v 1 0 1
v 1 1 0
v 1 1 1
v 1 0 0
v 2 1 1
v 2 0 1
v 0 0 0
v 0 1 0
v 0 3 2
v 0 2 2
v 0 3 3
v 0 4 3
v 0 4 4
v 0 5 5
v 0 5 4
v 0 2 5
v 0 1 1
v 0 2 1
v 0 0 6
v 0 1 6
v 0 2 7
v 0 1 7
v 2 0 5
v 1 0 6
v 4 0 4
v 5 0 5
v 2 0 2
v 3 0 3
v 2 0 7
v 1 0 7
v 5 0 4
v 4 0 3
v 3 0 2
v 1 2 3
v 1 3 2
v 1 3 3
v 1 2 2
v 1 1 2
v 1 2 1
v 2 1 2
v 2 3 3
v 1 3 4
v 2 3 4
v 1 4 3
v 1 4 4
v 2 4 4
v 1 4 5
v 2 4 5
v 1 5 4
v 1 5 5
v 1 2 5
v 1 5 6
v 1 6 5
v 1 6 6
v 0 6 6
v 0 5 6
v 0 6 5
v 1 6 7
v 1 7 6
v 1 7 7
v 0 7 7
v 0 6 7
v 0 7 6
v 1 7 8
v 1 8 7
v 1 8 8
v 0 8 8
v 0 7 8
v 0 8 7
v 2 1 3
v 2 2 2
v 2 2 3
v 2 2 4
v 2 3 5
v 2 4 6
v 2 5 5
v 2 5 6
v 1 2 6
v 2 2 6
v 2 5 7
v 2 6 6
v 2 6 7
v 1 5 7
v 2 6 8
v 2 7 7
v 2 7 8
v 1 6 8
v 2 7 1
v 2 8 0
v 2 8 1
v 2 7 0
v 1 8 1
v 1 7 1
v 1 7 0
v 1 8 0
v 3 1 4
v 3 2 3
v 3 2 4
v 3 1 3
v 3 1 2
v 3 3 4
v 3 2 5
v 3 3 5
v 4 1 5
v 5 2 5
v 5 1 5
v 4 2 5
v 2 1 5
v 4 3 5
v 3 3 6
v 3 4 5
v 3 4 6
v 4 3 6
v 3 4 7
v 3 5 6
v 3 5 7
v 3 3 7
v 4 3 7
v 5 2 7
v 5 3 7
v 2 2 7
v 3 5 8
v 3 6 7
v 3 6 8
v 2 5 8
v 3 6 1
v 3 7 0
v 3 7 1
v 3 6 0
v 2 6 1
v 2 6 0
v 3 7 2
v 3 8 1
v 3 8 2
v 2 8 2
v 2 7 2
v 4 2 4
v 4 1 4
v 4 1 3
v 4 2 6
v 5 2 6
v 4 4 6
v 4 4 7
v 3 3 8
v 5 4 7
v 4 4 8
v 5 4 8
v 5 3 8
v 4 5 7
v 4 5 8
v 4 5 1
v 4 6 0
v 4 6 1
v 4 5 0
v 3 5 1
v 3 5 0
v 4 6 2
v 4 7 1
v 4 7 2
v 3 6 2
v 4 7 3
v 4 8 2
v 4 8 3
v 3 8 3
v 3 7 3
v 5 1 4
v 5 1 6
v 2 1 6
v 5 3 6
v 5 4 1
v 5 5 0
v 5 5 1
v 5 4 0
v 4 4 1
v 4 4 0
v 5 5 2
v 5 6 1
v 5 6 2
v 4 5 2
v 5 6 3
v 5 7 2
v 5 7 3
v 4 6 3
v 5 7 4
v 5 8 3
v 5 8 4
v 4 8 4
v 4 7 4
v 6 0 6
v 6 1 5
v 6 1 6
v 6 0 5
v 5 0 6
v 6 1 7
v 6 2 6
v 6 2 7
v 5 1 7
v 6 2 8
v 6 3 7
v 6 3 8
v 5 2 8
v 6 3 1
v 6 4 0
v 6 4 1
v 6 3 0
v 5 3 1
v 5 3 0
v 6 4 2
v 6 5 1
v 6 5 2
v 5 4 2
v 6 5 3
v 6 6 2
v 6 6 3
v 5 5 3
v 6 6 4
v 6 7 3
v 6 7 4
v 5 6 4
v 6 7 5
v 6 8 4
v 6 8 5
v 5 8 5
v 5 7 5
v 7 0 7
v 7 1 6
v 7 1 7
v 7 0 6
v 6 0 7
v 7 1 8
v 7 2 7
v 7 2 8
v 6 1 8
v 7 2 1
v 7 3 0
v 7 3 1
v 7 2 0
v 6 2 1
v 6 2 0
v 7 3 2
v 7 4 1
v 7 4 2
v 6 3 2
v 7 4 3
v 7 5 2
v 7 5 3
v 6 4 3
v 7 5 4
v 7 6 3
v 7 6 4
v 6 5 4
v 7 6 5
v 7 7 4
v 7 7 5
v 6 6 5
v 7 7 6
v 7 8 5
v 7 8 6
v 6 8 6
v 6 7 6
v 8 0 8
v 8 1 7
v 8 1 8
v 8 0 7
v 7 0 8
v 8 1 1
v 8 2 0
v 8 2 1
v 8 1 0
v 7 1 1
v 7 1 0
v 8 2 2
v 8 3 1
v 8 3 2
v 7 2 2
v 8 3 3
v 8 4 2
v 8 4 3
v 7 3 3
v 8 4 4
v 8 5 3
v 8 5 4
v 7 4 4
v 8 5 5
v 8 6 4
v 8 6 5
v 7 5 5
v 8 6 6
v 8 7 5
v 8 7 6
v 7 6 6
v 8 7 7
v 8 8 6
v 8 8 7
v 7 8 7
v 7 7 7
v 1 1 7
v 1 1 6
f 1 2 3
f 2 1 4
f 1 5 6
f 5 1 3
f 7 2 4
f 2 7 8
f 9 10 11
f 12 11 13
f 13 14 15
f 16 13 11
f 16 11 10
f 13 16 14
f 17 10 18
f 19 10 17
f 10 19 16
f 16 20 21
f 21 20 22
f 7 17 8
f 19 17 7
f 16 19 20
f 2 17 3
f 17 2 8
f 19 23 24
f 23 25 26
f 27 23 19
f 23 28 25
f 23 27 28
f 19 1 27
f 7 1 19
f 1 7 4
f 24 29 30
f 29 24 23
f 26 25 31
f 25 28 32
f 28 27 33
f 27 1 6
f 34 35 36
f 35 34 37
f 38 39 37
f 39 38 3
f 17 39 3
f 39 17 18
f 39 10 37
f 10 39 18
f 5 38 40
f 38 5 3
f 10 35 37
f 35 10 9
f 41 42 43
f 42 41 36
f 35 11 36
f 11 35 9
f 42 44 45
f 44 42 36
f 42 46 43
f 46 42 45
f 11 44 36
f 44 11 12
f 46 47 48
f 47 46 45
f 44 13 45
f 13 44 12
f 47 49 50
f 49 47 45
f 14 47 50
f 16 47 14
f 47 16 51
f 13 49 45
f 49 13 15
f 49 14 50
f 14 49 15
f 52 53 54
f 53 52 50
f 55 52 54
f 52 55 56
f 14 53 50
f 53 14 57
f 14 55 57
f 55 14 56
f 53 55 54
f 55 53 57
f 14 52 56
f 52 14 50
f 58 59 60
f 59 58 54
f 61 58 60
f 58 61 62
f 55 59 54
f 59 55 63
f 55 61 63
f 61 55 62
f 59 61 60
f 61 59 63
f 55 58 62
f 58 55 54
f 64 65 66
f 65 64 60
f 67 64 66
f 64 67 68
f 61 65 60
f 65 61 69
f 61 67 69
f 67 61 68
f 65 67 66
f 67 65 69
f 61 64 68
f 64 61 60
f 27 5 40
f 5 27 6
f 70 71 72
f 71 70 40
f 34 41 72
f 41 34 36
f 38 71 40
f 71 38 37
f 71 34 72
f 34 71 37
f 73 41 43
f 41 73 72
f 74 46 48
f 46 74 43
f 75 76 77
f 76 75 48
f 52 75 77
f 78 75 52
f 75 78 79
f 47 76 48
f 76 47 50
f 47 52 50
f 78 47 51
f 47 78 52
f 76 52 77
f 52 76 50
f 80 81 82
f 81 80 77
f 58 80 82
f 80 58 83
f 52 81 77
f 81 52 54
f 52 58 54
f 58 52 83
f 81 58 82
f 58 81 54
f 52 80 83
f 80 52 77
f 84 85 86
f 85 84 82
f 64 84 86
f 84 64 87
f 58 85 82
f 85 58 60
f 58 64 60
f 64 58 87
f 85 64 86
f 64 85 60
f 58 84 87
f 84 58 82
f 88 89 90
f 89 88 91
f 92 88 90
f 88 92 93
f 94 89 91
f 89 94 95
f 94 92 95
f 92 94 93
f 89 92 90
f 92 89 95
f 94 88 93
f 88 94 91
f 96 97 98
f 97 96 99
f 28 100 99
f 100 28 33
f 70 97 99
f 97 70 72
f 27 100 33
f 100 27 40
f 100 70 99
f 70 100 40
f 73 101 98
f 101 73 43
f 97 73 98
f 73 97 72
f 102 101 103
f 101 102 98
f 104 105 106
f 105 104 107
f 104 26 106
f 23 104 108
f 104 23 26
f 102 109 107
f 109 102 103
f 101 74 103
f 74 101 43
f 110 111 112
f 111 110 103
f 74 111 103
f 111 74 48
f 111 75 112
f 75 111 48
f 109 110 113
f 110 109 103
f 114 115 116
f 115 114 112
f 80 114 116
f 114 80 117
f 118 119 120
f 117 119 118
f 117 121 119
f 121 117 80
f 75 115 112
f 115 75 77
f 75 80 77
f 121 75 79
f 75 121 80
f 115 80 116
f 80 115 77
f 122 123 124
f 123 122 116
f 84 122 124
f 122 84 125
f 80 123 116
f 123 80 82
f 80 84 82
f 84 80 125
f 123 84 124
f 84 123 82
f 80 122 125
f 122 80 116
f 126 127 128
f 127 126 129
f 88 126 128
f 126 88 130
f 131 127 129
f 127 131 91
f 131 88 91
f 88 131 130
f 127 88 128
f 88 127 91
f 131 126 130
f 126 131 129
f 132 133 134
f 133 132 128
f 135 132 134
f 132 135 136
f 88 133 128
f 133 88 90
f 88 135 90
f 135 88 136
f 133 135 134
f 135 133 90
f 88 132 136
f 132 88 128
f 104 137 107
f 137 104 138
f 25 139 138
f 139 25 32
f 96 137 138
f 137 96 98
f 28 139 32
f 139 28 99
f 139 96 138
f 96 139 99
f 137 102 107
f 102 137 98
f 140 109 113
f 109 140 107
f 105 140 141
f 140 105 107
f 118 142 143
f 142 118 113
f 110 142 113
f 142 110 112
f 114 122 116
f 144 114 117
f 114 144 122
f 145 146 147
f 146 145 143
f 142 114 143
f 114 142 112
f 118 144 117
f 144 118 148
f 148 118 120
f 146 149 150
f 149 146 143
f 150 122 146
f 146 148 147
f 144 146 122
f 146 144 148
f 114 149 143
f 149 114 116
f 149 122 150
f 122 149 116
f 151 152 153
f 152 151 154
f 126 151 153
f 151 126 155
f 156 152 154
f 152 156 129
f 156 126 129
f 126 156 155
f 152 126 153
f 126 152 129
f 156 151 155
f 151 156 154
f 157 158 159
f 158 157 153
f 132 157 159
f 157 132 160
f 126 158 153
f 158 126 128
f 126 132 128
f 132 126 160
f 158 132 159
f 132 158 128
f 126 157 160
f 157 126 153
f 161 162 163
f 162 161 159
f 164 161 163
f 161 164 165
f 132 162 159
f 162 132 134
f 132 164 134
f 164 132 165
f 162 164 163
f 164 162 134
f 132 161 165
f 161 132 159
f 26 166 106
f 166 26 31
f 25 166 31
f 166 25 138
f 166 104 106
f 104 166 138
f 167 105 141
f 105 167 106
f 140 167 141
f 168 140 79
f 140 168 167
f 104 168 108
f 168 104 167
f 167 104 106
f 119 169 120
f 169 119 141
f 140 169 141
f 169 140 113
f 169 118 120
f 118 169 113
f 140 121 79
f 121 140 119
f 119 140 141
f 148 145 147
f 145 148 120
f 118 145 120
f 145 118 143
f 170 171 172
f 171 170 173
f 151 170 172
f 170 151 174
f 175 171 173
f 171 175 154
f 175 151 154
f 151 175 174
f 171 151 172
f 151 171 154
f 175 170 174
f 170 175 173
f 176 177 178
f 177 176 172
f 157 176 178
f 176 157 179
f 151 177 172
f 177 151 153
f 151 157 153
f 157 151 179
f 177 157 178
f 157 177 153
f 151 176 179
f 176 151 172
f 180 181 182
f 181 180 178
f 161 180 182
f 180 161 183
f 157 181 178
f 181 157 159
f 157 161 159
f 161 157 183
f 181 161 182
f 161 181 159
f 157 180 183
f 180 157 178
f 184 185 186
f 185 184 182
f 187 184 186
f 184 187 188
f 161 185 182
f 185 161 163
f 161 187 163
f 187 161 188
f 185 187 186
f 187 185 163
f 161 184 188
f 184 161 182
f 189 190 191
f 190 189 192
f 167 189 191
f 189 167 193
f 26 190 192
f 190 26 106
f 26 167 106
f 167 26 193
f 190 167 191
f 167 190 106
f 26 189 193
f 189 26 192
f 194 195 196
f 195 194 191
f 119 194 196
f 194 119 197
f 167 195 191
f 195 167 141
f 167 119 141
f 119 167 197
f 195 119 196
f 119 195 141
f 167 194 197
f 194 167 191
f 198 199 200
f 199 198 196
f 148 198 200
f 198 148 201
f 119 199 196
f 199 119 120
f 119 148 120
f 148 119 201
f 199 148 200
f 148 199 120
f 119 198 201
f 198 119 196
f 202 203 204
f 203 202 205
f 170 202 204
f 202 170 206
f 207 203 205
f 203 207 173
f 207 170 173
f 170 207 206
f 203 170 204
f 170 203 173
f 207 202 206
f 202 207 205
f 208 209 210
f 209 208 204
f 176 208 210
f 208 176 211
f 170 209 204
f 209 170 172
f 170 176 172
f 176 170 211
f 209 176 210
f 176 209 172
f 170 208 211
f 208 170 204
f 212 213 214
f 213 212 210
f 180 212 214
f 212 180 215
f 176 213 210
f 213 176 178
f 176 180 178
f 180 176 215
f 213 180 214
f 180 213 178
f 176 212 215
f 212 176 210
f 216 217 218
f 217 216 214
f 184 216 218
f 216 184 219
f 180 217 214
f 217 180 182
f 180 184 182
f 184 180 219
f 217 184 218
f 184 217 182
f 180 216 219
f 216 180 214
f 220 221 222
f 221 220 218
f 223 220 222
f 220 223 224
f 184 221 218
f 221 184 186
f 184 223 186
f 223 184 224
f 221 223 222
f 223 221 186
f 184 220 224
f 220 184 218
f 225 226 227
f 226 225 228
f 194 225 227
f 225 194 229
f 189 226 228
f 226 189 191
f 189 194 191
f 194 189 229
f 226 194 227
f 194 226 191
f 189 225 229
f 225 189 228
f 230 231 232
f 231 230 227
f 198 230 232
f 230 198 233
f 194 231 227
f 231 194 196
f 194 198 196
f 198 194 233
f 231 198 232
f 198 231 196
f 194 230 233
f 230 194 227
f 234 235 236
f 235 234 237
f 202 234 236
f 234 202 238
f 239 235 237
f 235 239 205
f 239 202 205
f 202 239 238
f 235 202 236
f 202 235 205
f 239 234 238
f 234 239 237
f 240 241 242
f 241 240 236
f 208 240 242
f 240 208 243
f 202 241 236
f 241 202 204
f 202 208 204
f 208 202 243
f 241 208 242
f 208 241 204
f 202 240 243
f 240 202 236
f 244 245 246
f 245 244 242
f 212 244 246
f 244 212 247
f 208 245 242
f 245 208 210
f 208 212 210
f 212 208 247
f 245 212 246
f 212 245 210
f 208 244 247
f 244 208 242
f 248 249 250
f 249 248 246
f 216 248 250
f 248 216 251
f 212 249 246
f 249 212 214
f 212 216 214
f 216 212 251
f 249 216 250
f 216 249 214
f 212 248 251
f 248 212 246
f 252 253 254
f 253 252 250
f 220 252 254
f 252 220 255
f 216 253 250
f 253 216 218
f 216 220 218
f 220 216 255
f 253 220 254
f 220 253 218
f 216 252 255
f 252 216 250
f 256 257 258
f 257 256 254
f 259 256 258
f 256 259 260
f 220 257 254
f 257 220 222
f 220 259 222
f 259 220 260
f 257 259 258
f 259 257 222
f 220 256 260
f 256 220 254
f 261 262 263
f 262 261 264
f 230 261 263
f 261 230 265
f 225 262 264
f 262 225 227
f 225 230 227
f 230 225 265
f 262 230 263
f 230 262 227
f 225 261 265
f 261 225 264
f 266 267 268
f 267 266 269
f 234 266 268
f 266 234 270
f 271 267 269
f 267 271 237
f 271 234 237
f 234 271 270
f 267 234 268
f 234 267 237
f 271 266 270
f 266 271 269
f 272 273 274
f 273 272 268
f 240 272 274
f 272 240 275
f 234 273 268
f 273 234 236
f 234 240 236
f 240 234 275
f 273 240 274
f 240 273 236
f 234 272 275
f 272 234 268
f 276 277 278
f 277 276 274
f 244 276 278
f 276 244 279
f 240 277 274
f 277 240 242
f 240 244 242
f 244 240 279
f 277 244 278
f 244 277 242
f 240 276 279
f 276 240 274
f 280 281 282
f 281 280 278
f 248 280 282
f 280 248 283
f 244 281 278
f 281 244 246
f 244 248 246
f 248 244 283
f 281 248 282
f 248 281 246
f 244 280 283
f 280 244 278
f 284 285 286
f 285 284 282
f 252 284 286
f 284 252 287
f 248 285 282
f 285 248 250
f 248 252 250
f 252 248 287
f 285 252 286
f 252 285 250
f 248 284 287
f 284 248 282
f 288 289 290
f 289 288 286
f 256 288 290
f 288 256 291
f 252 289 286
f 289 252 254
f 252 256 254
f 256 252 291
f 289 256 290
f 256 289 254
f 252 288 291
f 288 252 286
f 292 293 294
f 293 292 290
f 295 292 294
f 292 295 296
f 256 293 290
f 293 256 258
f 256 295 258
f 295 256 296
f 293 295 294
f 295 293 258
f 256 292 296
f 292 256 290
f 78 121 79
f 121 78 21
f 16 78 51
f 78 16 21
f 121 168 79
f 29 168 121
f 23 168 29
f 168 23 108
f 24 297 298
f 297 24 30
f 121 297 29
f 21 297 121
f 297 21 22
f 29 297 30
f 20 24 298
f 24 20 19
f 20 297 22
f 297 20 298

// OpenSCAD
union() {
    translate([0, 0, 0]) cube([1, 1, 1]);
    translate([0, 1, 1]) cube([1, 1, 1]);
    translate([0, 2, 2]) cube([1, 1, 1]);
    translate([0, 3, 3]) cube([1, 1, 1]);
    translate([0, 4, 4]) cube([1, 1, 1]);
    translate([0, 5, 5]) cube([1, 1, 1]);
    translate([0, 6, 6]) cube([1, 1, 1]);
    translate([0, 7, 7]) cube([1, 1, 1]);
    translate([1, 0, 1]) cube([1, 1, 1]);
    translate([1, 1, 2]) cube([1, 1, 1]);
    translate([1, 2, 3]) cube([1, 1, 1]);
    translate([1, 3, 4]) cube([1, 1, 1]);
    translate([1, 4, 5]) cube([1, 1, 1]);
    translate([1, 5, 6]) cube([1, 1, 1]);
    translate([1, 6, 7]) cube([1, 1, 1]);
    translate([1, 7, 0]) cube([1, 1, 1]);
    translate([2, 0, 2]) cube([1, 1, 1]);
    translate([2, 1, 3]) cube([1, 1, 1]);
    translate([2, 2, 4]) cube([1, 1, 1]);
    translate([2, 3, 5]) cube([1, 1, 1]);
    translate([2, 4, 6]) cube([1, 1, 1]);
    translate([2, 5, 7]) cube([1, 1, 1]);
    translate([2, 6, 0]) cube([1, 1, 1]);
    translate([2, 7, 1]) cube([1, 1, 1]);
    translate([3, 0, 3]) cube([1, 1, 1]);
    translate([3, 1, 4]) cube([1, 1, 1]);
    translate([3, 2, 5]) cube([1, 1, 1]);
    translate([3, 3, 6]) cube([1, 1, 1]);
    translate([3, 4, 7]) cube([1, 1, 1]);
    translate([3, 5, 0]) cube([1, 1, 1]);
    translate([3, 6, 1]) cube([1, 1, 1]);
    translate([3, 7, 2]) cube([1, 1, 1]);
    translate([4, 0, 4]) cube([1, 1, 1]);
    translate([4, 1, 5]) cube([1, 1, 1]);
    translate([4, 2, 6]) cube([1, 1, 1]);
    translate([4, 3, 7]) cube([1, 1, 1]);
    translate([4, 4, 0]) cube([1, 1, 1]);
    translate([4, 5, 1]) cube([1, 1, 1]);
    translate([4, 6, 2]) cube([1, 1, 1]);
    translate([4, 7, 3]) cube([1, 1, 1]);
    translate([5, 0, 5]) cube([1, 1, 1]);
    translate([5, 1, 6]) cube([1, 1, 1]);
    translate([5, 2, 7]) cube([1, 1, 1]);
    translate([5, 3, 0]) cube([1, 1, 1]);
    translate([5, 4, 1]) cube([1, 1, 1]);
    translate([5, 5, 2]) cube([1, 1, 1]);
    translate([5, 6, 3]) cube([1, 1, 1]);
    translate([5, 7, 4]) cube([1, 1, 1]);
    translate([6, 0, 6]) cube([1, 1, 1]);
    translate([6, 1, 7]) cube([1, 1, 1]);
    translate([6, 2, 0]) cube([1, 1, 1]);
    translate([6, 3, 1]) cube([1, 1, 1]);
    translate([6, 4, 2]) cube([1, 1, 1]);
    translate([6, 5, 3]) cube([1, 1, 1]);
    translate([6, 6, 4]) cube([1, 1, 1]);
    translate([6, 7, 5]) cube([1, 1, 1]);
    translate([7, 0, 7]) cube([1, 1, 1]);
    translate([7, 1, 0]) cube([1, 1, 1]);
    translate([7, 2, 1]) cube([1, 1, 1]);
    translate([7, 3, 2]) cube([1, 1, 1]);
    translate([7, 4, 3]) cube([1, 1, 1]);
    translate([7, 5, 4]) cube([1, 1, 1]);
    translate([7, 6, 5]) cube([1, 1, 1]);
    translate([7, 7, 6]) cube([1, 1, 1]);
    translate([0, 0, 1]) cube([1, 1, 1]);
    translate([0, 1, 2]) cube([1, 1, 1]);
    translate([0, 2, 3]) cube([1, 1, 1]);
    translate([0, 3, 4]) cube([1, 1, 1]);
    translate([1, 0, 2]) cube([1, 1, 1]);
    translate([1, 1, 3]) cube([1, 1, 1]);
    translate([1, 2, 4]) cube([1, 1, 1]);
    translate([1, 3, 5]) cube([1, 1, 1]);
    translate([2, 0, 3]) cube([1, 1, 1]);
    translate([2, 1, 4]) cube([1, 1, 1]);
    translate([2, 2, 5]) cube([1, 1, 1]);
    translate([2, 3, 6]) cube([1, 1, 1]);
    translate([3, 0, 4]) cube([1, 1, 1]);
    translate([3, 1, 5]) cube([1, 1, 1]);
    translate([3, 2, 6]) cube([1, 1, 1]);
    translate([3, 3, 7]) cube([1, 1, 1]);
    translate([0, 0, 2]) cube([1, 1, 1]);
    translate([0, 1, 3]) cube([1, 1, 1]);
    translate([0, 2, 4]) cube([1, 1, 1]);
    translate([1, 0, 3]) cube([1, 1, 1]);
    translate([1, 1, 4]) cube([1, 1, 1]);
    translate([1, 2, 5]) cube([1, 1, 1]);
    translate([2, 0, 4]) cube([1, 1, 1]);
    translate([2, 1, 5]) cube([1, 1, 1]);
    translate([2, 2, 6]) cube([1, 1, 1]);
    translate([0, 0, 3]) cube([1, 1, 1]);
    translate([0, 1, 4]) cube([1, 1, 1]);
    translate([1, 0, 4]) cube([1, 1, 1]);
    translate([1, 1, 5]) cube([1, 1, 1]);
    translate([0, 0, 4]) cube([1, 1, 1]);
    translate([0, 1, 5]) cube([1, 1, 1]);
    translate([1, 0, 5]) cube([1, 1, 1]);
    translate([1, 1, 6]) cube([1, 1, 1]);
    translate([0, 0, 5]) cube([1, 1, 1]);
    translate([0, 1, 6]) cube([1, 1, 1]);
    translate([1, 0, 6]) cube([1, 1, 1]);
}
